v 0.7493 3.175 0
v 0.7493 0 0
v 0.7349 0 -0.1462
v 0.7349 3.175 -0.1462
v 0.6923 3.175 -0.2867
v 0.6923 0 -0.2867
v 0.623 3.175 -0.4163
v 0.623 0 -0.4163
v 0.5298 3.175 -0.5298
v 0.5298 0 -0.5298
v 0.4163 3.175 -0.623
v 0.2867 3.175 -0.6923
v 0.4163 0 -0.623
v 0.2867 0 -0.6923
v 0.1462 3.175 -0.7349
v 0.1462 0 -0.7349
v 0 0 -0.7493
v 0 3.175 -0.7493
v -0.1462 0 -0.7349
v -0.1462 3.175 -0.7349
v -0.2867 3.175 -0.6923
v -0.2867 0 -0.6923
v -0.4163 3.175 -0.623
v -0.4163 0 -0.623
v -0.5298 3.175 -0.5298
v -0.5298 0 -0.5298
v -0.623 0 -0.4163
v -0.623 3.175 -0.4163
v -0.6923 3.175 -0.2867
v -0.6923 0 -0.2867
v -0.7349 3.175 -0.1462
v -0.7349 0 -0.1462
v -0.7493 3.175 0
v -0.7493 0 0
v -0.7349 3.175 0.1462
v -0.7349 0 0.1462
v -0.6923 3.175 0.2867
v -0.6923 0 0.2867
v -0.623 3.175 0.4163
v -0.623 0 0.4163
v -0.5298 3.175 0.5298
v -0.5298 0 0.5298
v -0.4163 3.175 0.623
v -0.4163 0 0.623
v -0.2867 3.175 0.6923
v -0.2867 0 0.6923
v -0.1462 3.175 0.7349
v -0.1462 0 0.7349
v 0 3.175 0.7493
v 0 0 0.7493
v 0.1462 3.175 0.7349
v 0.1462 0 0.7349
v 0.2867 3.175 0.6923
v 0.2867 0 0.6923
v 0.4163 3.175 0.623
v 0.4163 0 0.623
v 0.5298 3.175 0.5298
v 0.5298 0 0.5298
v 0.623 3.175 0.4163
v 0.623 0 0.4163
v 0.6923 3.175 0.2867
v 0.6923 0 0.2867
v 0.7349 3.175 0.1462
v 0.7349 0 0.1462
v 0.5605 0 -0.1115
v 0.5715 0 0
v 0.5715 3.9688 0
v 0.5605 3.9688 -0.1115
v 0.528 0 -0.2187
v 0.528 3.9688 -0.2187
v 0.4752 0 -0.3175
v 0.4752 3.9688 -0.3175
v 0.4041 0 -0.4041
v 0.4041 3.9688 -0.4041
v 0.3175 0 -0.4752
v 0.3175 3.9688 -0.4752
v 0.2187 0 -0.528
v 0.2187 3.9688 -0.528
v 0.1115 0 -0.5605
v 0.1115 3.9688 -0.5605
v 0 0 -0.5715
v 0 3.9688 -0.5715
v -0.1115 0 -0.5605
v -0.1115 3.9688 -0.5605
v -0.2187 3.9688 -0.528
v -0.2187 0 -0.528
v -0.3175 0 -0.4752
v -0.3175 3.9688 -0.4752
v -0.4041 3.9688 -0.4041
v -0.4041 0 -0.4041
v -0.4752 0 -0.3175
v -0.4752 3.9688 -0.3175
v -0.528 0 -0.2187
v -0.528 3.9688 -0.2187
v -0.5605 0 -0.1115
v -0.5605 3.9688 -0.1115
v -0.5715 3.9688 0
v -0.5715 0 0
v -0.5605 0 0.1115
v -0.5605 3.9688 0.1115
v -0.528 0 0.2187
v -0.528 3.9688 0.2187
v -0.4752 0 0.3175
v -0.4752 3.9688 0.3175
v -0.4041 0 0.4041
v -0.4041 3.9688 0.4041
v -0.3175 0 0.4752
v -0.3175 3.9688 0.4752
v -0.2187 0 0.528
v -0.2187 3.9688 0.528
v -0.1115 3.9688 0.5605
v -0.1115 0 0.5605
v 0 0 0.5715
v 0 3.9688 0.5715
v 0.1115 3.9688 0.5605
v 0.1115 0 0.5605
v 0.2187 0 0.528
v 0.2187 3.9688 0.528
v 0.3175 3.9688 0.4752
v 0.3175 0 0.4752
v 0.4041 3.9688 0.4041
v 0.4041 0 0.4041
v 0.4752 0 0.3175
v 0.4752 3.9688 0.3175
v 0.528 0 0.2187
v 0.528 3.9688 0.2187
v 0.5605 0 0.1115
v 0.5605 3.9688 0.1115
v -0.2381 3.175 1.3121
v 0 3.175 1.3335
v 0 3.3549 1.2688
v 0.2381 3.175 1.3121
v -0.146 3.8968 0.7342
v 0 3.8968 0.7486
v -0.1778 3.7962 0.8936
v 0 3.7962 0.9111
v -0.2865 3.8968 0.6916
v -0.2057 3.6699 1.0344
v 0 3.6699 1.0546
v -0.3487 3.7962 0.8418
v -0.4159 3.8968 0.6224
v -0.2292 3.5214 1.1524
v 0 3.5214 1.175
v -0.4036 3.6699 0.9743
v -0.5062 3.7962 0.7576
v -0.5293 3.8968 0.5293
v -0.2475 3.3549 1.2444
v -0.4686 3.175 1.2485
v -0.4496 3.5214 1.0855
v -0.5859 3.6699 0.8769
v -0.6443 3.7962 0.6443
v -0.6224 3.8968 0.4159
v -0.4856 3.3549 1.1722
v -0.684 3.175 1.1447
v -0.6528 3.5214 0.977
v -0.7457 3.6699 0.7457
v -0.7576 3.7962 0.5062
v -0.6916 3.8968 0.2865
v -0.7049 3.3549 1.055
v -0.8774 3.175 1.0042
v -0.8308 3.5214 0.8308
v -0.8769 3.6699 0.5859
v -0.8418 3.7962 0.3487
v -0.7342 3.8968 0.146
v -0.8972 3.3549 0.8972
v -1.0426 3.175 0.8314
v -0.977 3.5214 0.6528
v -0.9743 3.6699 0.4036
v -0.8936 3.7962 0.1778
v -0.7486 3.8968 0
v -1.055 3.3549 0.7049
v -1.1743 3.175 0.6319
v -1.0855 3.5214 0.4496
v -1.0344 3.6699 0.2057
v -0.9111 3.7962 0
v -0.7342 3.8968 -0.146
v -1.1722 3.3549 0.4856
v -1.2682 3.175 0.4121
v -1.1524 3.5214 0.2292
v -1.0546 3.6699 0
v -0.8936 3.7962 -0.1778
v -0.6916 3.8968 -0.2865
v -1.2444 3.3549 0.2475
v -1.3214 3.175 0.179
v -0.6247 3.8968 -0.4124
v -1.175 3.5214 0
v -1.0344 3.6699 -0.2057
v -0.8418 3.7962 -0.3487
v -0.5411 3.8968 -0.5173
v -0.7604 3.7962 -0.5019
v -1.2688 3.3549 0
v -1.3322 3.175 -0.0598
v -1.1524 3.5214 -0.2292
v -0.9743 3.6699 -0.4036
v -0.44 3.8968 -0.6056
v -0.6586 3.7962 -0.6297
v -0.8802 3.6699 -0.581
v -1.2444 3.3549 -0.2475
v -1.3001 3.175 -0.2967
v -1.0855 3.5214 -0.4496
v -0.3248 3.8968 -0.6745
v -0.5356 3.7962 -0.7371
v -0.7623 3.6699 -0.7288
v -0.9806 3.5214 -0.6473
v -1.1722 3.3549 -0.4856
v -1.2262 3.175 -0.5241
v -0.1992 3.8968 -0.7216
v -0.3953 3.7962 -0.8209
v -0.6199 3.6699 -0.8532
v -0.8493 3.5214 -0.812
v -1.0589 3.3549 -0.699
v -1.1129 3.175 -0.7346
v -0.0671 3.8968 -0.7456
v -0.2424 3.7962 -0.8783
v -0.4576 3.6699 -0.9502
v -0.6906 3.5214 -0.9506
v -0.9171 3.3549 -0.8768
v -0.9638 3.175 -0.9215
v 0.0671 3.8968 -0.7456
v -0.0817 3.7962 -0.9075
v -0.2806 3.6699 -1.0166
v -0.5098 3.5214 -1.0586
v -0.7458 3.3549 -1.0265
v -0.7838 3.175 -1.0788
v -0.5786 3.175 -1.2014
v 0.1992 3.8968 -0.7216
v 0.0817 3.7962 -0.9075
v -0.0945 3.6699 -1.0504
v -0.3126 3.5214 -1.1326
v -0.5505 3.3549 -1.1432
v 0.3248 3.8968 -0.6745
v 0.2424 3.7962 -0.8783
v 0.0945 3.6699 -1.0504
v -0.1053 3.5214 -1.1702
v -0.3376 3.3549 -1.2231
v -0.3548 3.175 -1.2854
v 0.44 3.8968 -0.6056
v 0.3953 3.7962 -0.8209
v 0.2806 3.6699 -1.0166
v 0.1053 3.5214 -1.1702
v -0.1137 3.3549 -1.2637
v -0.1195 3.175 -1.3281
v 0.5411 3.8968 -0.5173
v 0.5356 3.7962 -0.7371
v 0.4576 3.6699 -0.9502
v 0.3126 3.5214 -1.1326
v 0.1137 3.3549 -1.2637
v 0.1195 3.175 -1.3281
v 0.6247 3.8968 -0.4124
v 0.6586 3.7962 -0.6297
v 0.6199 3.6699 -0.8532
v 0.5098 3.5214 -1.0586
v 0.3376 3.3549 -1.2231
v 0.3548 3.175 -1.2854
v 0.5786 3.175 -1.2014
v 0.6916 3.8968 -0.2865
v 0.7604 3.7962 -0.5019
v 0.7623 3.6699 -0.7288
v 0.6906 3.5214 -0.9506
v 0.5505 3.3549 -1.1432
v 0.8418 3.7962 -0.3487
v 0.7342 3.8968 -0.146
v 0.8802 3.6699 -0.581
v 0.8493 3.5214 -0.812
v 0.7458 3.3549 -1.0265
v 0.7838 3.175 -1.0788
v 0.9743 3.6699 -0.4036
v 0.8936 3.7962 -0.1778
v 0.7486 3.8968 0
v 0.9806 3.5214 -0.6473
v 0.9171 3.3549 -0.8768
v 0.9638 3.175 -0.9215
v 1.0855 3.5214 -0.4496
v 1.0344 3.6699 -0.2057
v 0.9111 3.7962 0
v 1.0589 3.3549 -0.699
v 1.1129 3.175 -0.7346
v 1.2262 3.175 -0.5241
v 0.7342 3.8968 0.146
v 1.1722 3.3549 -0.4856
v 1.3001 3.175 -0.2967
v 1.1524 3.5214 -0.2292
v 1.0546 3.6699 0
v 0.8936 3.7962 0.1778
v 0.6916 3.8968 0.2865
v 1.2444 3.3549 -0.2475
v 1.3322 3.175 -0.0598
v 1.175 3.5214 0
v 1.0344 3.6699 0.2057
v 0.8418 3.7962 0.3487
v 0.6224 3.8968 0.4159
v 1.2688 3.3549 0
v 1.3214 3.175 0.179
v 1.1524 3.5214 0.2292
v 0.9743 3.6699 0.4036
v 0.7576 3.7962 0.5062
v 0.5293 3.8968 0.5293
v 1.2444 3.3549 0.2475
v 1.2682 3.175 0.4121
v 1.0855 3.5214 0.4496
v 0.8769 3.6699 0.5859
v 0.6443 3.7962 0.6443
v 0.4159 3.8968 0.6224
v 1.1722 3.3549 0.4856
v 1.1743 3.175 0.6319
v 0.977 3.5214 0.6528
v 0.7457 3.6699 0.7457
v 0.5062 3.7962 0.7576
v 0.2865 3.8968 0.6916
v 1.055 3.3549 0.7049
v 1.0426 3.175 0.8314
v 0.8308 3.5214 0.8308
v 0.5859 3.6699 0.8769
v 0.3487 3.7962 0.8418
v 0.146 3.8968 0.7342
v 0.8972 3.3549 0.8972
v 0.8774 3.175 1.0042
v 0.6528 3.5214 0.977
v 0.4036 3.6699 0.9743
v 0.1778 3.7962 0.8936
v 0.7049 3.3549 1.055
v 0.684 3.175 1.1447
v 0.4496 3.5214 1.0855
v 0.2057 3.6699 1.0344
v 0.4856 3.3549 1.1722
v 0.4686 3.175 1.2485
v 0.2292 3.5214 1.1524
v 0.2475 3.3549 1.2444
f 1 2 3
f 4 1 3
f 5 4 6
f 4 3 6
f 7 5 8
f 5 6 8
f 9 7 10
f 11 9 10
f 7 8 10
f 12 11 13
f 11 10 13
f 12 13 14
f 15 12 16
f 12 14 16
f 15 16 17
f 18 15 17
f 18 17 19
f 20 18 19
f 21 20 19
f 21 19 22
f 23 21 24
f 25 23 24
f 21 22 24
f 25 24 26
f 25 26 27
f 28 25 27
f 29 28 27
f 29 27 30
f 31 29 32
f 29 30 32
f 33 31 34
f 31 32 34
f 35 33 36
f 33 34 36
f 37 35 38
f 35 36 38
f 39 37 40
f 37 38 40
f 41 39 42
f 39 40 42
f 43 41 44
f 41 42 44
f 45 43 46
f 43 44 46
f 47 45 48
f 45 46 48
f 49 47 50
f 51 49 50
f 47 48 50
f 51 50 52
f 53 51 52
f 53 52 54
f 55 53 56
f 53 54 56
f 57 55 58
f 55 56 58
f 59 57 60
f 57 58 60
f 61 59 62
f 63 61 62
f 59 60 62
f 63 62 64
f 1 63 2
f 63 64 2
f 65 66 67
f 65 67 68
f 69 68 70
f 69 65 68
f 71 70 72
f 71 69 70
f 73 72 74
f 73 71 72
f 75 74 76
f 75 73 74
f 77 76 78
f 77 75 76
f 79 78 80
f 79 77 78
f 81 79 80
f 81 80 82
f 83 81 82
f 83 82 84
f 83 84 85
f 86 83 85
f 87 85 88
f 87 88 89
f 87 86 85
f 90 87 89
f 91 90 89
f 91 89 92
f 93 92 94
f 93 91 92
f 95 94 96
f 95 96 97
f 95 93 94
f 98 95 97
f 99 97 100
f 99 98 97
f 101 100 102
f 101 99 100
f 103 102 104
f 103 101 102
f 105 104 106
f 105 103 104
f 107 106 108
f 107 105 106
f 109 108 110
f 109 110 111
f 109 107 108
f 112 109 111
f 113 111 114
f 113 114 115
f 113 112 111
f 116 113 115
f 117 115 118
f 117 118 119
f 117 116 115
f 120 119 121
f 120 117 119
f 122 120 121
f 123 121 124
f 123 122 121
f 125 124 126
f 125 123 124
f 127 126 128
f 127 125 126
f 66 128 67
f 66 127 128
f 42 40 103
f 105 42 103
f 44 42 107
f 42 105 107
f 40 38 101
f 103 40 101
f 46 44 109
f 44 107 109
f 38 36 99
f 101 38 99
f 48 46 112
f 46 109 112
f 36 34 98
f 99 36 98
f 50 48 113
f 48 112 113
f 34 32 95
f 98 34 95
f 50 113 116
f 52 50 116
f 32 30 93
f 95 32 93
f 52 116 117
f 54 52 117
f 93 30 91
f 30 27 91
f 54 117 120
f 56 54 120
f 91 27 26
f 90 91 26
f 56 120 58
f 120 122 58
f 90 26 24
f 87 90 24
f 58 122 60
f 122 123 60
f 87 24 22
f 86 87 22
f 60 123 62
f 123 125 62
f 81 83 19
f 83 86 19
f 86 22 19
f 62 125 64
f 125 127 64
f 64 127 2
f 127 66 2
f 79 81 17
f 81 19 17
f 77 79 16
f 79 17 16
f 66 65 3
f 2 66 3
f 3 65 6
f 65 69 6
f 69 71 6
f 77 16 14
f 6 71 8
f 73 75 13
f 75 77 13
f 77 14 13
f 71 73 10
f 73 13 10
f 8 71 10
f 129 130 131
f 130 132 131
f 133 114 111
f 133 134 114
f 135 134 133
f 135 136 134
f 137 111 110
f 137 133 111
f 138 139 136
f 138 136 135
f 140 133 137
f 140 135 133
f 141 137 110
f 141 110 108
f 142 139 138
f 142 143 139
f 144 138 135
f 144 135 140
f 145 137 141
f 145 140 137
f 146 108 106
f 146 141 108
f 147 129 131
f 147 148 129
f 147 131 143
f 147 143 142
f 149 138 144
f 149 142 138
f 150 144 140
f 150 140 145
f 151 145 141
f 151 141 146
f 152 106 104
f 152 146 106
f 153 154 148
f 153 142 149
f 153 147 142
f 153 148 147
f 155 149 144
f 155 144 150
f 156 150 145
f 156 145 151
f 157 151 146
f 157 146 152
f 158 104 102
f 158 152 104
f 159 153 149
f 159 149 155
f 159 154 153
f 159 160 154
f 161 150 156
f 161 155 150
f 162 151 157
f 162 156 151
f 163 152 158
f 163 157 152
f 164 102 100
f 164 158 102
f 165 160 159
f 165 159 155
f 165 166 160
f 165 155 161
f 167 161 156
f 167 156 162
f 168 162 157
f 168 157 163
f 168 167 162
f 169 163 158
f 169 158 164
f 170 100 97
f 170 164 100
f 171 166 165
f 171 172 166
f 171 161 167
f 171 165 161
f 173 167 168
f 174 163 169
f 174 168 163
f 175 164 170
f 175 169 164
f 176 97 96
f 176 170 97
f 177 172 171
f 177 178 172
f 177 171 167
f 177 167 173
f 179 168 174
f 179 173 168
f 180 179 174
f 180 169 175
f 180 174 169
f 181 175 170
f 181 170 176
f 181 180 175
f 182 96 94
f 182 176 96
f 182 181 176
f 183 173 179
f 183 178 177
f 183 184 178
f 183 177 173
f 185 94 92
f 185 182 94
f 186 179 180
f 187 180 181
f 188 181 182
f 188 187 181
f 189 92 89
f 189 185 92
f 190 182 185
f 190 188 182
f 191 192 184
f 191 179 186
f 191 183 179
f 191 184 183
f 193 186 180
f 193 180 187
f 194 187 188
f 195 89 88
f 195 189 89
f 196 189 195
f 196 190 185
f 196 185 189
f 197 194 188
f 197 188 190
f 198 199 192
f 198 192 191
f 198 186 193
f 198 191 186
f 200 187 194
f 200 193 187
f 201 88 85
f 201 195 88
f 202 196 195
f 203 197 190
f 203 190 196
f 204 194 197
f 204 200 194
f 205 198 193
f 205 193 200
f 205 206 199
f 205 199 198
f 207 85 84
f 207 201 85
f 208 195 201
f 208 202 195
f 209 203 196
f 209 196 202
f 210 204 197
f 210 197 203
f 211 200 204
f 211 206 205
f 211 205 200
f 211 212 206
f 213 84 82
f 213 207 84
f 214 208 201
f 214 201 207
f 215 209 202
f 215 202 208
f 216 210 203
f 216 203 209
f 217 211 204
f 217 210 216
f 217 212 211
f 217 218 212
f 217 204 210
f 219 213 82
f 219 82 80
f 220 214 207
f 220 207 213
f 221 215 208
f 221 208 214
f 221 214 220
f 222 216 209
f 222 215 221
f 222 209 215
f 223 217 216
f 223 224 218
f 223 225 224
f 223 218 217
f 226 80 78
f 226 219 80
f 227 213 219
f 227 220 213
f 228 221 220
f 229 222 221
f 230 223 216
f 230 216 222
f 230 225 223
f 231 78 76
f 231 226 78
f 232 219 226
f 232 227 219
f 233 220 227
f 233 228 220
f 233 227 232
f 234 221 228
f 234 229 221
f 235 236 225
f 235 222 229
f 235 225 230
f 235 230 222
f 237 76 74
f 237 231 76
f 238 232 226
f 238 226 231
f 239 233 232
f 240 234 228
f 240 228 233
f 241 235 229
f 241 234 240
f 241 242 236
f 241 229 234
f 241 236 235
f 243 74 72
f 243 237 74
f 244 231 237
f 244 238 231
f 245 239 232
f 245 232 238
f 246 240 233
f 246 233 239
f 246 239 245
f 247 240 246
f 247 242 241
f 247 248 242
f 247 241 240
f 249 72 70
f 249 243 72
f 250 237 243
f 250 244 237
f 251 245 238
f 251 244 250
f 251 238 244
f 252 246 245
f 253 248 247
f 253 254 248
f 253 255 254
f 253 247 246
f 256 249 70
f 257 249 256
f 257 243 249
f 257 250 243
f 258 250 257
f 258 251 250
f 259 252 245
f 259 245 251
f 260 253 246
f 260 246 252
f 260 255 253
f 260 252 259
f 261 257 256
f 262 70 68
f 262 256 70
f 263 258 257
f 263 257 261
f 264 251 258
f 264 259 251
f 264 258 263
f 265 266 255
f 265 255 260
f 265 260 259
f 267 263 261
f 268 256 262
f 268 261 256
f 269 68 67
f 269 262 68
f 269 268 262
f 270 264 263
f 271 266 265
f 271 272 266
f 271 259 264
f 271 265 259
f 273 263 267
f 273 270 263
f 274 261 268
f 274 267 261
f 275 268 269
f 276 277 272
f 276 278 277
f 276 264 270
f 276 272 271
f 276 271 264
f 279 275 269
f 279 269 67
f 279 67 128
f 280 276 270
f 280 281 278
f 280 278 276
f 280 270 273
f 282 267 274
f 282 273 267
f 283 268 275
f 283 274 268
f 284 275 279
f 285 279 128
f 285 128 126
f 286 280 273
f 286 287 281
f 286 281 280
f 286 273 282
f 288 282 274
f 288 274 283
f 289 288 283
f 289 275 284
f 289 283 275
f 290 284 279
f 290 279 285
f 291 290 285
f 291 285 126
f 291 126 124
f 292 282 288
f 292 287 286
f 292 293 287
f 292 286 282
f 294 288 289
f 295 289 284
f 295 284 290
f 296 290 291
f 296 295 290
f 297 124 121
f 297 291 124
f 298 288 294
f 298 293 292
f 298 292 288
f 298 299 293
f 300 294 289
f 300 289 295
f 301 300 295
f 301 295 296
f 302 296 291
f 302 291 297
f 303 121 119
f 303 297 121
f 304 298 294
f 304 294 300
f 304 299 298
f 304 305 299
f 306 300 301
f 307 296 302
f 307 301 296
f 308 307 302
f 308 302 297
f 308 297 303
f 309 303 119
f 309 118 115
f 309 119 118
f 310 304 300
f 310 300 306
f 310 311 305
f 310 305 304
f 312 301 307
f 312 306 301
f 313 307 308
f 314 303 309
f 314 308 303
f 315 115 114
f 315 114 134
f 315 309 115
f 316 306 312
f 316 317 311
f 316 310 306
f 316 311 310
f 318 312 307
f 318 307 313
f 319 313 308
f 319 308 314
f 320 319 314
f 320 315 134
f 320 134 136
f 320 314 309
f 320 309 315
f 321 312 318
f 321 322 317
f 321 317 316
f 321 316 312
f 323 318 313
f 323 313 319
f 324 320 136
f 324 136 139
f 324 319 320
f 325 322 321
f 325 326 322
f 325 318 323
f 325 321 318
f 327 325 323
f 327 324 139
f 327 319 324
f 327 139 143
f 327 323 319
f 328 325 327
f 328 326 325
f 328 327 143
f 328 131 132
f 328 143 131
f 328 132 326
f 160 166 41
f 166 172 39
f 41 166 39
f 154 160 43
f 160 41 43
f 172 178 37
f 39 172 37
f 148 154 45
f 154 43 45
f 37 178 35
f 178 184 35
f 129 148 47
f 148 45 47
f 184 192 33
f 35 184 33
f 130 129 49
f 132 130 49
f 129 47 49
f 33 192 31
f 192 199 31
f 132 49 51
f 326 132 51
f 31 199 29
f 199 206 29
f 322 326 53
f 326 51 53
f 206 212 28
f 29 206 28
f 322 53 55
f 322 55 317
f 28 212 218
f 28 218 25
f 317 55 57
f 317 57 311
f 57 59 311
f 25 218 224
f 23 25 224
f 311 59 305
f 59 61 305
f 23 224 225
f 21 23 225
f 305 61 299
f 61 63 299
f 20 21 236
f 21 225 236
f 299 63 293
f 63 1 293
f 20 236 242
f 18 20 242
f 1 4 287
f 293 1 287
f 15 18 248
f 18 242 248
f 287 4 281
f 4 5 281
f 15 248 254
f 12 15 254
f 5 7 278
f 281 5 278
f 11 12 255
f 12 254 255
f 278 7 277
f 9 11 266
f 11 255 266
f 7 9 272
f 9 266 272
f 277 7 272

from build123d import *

# Parameters (mm, degrees)
SKETCH1_R           = 0.7493
SKETCH1_R_2         = 0.5715
BARREL_DEPTH        = 3.175
SKETCH2_R           = 1.3335
SKETCH2_R_2         = 0.5715
BOSS_EXTRUDE2_DEPTH = 0.79375


with BuildPart() as part:
    # Sketch1 → Barrel (new body)
    with BuildSketch(Plane(origin=(0, 0, 0), x_dir=(1, 0, 0), z_dir=(0, 1, 0))):
        Circle(SKETCH1_R)
        Circle(SKETCH1_R_2, mode=Mode.SUBTRACT)
    extrude(amount=BARREL_DEPTH)

    # Sketch2 → Boss-Extrude2 (add)
    with BuildSketch(Plane(origin=(0, 3.175, 0), x_dir=(1, 0, 0), z_dir=(0, 1, 0))):
        Circle(SKETCH2_R)
        Circle(SKETCH2_R_2, mode=Mode.SUBTRACT)
    extrude(amount=BOSS_EXTRUDE2_DEPTH)

    # Sketch4 → Cut-Revolve11 (revolve, cut)
    with BuildSketch(Plane(origin=(0, 0, 0), x_dir=(0, 0, -1), z_dir=(1, 0, 0))):
        with BuildLine():
            Line((-1.3335, 3.175), (-1.3335, 3.96875))
            Line((-1.3335, 3.96875), (-0.5715, 3.96875))
            ThreePointArc((-0.5715, 3.96875), (-1.054623655, 3.669913708), (-1.3335, 3.175))
        make_face()
    revolve(axis=Axis((0, 3.96875, 0), (0, -1, 0)), mode=Mode.SUBTRACT)


solid = part.part
